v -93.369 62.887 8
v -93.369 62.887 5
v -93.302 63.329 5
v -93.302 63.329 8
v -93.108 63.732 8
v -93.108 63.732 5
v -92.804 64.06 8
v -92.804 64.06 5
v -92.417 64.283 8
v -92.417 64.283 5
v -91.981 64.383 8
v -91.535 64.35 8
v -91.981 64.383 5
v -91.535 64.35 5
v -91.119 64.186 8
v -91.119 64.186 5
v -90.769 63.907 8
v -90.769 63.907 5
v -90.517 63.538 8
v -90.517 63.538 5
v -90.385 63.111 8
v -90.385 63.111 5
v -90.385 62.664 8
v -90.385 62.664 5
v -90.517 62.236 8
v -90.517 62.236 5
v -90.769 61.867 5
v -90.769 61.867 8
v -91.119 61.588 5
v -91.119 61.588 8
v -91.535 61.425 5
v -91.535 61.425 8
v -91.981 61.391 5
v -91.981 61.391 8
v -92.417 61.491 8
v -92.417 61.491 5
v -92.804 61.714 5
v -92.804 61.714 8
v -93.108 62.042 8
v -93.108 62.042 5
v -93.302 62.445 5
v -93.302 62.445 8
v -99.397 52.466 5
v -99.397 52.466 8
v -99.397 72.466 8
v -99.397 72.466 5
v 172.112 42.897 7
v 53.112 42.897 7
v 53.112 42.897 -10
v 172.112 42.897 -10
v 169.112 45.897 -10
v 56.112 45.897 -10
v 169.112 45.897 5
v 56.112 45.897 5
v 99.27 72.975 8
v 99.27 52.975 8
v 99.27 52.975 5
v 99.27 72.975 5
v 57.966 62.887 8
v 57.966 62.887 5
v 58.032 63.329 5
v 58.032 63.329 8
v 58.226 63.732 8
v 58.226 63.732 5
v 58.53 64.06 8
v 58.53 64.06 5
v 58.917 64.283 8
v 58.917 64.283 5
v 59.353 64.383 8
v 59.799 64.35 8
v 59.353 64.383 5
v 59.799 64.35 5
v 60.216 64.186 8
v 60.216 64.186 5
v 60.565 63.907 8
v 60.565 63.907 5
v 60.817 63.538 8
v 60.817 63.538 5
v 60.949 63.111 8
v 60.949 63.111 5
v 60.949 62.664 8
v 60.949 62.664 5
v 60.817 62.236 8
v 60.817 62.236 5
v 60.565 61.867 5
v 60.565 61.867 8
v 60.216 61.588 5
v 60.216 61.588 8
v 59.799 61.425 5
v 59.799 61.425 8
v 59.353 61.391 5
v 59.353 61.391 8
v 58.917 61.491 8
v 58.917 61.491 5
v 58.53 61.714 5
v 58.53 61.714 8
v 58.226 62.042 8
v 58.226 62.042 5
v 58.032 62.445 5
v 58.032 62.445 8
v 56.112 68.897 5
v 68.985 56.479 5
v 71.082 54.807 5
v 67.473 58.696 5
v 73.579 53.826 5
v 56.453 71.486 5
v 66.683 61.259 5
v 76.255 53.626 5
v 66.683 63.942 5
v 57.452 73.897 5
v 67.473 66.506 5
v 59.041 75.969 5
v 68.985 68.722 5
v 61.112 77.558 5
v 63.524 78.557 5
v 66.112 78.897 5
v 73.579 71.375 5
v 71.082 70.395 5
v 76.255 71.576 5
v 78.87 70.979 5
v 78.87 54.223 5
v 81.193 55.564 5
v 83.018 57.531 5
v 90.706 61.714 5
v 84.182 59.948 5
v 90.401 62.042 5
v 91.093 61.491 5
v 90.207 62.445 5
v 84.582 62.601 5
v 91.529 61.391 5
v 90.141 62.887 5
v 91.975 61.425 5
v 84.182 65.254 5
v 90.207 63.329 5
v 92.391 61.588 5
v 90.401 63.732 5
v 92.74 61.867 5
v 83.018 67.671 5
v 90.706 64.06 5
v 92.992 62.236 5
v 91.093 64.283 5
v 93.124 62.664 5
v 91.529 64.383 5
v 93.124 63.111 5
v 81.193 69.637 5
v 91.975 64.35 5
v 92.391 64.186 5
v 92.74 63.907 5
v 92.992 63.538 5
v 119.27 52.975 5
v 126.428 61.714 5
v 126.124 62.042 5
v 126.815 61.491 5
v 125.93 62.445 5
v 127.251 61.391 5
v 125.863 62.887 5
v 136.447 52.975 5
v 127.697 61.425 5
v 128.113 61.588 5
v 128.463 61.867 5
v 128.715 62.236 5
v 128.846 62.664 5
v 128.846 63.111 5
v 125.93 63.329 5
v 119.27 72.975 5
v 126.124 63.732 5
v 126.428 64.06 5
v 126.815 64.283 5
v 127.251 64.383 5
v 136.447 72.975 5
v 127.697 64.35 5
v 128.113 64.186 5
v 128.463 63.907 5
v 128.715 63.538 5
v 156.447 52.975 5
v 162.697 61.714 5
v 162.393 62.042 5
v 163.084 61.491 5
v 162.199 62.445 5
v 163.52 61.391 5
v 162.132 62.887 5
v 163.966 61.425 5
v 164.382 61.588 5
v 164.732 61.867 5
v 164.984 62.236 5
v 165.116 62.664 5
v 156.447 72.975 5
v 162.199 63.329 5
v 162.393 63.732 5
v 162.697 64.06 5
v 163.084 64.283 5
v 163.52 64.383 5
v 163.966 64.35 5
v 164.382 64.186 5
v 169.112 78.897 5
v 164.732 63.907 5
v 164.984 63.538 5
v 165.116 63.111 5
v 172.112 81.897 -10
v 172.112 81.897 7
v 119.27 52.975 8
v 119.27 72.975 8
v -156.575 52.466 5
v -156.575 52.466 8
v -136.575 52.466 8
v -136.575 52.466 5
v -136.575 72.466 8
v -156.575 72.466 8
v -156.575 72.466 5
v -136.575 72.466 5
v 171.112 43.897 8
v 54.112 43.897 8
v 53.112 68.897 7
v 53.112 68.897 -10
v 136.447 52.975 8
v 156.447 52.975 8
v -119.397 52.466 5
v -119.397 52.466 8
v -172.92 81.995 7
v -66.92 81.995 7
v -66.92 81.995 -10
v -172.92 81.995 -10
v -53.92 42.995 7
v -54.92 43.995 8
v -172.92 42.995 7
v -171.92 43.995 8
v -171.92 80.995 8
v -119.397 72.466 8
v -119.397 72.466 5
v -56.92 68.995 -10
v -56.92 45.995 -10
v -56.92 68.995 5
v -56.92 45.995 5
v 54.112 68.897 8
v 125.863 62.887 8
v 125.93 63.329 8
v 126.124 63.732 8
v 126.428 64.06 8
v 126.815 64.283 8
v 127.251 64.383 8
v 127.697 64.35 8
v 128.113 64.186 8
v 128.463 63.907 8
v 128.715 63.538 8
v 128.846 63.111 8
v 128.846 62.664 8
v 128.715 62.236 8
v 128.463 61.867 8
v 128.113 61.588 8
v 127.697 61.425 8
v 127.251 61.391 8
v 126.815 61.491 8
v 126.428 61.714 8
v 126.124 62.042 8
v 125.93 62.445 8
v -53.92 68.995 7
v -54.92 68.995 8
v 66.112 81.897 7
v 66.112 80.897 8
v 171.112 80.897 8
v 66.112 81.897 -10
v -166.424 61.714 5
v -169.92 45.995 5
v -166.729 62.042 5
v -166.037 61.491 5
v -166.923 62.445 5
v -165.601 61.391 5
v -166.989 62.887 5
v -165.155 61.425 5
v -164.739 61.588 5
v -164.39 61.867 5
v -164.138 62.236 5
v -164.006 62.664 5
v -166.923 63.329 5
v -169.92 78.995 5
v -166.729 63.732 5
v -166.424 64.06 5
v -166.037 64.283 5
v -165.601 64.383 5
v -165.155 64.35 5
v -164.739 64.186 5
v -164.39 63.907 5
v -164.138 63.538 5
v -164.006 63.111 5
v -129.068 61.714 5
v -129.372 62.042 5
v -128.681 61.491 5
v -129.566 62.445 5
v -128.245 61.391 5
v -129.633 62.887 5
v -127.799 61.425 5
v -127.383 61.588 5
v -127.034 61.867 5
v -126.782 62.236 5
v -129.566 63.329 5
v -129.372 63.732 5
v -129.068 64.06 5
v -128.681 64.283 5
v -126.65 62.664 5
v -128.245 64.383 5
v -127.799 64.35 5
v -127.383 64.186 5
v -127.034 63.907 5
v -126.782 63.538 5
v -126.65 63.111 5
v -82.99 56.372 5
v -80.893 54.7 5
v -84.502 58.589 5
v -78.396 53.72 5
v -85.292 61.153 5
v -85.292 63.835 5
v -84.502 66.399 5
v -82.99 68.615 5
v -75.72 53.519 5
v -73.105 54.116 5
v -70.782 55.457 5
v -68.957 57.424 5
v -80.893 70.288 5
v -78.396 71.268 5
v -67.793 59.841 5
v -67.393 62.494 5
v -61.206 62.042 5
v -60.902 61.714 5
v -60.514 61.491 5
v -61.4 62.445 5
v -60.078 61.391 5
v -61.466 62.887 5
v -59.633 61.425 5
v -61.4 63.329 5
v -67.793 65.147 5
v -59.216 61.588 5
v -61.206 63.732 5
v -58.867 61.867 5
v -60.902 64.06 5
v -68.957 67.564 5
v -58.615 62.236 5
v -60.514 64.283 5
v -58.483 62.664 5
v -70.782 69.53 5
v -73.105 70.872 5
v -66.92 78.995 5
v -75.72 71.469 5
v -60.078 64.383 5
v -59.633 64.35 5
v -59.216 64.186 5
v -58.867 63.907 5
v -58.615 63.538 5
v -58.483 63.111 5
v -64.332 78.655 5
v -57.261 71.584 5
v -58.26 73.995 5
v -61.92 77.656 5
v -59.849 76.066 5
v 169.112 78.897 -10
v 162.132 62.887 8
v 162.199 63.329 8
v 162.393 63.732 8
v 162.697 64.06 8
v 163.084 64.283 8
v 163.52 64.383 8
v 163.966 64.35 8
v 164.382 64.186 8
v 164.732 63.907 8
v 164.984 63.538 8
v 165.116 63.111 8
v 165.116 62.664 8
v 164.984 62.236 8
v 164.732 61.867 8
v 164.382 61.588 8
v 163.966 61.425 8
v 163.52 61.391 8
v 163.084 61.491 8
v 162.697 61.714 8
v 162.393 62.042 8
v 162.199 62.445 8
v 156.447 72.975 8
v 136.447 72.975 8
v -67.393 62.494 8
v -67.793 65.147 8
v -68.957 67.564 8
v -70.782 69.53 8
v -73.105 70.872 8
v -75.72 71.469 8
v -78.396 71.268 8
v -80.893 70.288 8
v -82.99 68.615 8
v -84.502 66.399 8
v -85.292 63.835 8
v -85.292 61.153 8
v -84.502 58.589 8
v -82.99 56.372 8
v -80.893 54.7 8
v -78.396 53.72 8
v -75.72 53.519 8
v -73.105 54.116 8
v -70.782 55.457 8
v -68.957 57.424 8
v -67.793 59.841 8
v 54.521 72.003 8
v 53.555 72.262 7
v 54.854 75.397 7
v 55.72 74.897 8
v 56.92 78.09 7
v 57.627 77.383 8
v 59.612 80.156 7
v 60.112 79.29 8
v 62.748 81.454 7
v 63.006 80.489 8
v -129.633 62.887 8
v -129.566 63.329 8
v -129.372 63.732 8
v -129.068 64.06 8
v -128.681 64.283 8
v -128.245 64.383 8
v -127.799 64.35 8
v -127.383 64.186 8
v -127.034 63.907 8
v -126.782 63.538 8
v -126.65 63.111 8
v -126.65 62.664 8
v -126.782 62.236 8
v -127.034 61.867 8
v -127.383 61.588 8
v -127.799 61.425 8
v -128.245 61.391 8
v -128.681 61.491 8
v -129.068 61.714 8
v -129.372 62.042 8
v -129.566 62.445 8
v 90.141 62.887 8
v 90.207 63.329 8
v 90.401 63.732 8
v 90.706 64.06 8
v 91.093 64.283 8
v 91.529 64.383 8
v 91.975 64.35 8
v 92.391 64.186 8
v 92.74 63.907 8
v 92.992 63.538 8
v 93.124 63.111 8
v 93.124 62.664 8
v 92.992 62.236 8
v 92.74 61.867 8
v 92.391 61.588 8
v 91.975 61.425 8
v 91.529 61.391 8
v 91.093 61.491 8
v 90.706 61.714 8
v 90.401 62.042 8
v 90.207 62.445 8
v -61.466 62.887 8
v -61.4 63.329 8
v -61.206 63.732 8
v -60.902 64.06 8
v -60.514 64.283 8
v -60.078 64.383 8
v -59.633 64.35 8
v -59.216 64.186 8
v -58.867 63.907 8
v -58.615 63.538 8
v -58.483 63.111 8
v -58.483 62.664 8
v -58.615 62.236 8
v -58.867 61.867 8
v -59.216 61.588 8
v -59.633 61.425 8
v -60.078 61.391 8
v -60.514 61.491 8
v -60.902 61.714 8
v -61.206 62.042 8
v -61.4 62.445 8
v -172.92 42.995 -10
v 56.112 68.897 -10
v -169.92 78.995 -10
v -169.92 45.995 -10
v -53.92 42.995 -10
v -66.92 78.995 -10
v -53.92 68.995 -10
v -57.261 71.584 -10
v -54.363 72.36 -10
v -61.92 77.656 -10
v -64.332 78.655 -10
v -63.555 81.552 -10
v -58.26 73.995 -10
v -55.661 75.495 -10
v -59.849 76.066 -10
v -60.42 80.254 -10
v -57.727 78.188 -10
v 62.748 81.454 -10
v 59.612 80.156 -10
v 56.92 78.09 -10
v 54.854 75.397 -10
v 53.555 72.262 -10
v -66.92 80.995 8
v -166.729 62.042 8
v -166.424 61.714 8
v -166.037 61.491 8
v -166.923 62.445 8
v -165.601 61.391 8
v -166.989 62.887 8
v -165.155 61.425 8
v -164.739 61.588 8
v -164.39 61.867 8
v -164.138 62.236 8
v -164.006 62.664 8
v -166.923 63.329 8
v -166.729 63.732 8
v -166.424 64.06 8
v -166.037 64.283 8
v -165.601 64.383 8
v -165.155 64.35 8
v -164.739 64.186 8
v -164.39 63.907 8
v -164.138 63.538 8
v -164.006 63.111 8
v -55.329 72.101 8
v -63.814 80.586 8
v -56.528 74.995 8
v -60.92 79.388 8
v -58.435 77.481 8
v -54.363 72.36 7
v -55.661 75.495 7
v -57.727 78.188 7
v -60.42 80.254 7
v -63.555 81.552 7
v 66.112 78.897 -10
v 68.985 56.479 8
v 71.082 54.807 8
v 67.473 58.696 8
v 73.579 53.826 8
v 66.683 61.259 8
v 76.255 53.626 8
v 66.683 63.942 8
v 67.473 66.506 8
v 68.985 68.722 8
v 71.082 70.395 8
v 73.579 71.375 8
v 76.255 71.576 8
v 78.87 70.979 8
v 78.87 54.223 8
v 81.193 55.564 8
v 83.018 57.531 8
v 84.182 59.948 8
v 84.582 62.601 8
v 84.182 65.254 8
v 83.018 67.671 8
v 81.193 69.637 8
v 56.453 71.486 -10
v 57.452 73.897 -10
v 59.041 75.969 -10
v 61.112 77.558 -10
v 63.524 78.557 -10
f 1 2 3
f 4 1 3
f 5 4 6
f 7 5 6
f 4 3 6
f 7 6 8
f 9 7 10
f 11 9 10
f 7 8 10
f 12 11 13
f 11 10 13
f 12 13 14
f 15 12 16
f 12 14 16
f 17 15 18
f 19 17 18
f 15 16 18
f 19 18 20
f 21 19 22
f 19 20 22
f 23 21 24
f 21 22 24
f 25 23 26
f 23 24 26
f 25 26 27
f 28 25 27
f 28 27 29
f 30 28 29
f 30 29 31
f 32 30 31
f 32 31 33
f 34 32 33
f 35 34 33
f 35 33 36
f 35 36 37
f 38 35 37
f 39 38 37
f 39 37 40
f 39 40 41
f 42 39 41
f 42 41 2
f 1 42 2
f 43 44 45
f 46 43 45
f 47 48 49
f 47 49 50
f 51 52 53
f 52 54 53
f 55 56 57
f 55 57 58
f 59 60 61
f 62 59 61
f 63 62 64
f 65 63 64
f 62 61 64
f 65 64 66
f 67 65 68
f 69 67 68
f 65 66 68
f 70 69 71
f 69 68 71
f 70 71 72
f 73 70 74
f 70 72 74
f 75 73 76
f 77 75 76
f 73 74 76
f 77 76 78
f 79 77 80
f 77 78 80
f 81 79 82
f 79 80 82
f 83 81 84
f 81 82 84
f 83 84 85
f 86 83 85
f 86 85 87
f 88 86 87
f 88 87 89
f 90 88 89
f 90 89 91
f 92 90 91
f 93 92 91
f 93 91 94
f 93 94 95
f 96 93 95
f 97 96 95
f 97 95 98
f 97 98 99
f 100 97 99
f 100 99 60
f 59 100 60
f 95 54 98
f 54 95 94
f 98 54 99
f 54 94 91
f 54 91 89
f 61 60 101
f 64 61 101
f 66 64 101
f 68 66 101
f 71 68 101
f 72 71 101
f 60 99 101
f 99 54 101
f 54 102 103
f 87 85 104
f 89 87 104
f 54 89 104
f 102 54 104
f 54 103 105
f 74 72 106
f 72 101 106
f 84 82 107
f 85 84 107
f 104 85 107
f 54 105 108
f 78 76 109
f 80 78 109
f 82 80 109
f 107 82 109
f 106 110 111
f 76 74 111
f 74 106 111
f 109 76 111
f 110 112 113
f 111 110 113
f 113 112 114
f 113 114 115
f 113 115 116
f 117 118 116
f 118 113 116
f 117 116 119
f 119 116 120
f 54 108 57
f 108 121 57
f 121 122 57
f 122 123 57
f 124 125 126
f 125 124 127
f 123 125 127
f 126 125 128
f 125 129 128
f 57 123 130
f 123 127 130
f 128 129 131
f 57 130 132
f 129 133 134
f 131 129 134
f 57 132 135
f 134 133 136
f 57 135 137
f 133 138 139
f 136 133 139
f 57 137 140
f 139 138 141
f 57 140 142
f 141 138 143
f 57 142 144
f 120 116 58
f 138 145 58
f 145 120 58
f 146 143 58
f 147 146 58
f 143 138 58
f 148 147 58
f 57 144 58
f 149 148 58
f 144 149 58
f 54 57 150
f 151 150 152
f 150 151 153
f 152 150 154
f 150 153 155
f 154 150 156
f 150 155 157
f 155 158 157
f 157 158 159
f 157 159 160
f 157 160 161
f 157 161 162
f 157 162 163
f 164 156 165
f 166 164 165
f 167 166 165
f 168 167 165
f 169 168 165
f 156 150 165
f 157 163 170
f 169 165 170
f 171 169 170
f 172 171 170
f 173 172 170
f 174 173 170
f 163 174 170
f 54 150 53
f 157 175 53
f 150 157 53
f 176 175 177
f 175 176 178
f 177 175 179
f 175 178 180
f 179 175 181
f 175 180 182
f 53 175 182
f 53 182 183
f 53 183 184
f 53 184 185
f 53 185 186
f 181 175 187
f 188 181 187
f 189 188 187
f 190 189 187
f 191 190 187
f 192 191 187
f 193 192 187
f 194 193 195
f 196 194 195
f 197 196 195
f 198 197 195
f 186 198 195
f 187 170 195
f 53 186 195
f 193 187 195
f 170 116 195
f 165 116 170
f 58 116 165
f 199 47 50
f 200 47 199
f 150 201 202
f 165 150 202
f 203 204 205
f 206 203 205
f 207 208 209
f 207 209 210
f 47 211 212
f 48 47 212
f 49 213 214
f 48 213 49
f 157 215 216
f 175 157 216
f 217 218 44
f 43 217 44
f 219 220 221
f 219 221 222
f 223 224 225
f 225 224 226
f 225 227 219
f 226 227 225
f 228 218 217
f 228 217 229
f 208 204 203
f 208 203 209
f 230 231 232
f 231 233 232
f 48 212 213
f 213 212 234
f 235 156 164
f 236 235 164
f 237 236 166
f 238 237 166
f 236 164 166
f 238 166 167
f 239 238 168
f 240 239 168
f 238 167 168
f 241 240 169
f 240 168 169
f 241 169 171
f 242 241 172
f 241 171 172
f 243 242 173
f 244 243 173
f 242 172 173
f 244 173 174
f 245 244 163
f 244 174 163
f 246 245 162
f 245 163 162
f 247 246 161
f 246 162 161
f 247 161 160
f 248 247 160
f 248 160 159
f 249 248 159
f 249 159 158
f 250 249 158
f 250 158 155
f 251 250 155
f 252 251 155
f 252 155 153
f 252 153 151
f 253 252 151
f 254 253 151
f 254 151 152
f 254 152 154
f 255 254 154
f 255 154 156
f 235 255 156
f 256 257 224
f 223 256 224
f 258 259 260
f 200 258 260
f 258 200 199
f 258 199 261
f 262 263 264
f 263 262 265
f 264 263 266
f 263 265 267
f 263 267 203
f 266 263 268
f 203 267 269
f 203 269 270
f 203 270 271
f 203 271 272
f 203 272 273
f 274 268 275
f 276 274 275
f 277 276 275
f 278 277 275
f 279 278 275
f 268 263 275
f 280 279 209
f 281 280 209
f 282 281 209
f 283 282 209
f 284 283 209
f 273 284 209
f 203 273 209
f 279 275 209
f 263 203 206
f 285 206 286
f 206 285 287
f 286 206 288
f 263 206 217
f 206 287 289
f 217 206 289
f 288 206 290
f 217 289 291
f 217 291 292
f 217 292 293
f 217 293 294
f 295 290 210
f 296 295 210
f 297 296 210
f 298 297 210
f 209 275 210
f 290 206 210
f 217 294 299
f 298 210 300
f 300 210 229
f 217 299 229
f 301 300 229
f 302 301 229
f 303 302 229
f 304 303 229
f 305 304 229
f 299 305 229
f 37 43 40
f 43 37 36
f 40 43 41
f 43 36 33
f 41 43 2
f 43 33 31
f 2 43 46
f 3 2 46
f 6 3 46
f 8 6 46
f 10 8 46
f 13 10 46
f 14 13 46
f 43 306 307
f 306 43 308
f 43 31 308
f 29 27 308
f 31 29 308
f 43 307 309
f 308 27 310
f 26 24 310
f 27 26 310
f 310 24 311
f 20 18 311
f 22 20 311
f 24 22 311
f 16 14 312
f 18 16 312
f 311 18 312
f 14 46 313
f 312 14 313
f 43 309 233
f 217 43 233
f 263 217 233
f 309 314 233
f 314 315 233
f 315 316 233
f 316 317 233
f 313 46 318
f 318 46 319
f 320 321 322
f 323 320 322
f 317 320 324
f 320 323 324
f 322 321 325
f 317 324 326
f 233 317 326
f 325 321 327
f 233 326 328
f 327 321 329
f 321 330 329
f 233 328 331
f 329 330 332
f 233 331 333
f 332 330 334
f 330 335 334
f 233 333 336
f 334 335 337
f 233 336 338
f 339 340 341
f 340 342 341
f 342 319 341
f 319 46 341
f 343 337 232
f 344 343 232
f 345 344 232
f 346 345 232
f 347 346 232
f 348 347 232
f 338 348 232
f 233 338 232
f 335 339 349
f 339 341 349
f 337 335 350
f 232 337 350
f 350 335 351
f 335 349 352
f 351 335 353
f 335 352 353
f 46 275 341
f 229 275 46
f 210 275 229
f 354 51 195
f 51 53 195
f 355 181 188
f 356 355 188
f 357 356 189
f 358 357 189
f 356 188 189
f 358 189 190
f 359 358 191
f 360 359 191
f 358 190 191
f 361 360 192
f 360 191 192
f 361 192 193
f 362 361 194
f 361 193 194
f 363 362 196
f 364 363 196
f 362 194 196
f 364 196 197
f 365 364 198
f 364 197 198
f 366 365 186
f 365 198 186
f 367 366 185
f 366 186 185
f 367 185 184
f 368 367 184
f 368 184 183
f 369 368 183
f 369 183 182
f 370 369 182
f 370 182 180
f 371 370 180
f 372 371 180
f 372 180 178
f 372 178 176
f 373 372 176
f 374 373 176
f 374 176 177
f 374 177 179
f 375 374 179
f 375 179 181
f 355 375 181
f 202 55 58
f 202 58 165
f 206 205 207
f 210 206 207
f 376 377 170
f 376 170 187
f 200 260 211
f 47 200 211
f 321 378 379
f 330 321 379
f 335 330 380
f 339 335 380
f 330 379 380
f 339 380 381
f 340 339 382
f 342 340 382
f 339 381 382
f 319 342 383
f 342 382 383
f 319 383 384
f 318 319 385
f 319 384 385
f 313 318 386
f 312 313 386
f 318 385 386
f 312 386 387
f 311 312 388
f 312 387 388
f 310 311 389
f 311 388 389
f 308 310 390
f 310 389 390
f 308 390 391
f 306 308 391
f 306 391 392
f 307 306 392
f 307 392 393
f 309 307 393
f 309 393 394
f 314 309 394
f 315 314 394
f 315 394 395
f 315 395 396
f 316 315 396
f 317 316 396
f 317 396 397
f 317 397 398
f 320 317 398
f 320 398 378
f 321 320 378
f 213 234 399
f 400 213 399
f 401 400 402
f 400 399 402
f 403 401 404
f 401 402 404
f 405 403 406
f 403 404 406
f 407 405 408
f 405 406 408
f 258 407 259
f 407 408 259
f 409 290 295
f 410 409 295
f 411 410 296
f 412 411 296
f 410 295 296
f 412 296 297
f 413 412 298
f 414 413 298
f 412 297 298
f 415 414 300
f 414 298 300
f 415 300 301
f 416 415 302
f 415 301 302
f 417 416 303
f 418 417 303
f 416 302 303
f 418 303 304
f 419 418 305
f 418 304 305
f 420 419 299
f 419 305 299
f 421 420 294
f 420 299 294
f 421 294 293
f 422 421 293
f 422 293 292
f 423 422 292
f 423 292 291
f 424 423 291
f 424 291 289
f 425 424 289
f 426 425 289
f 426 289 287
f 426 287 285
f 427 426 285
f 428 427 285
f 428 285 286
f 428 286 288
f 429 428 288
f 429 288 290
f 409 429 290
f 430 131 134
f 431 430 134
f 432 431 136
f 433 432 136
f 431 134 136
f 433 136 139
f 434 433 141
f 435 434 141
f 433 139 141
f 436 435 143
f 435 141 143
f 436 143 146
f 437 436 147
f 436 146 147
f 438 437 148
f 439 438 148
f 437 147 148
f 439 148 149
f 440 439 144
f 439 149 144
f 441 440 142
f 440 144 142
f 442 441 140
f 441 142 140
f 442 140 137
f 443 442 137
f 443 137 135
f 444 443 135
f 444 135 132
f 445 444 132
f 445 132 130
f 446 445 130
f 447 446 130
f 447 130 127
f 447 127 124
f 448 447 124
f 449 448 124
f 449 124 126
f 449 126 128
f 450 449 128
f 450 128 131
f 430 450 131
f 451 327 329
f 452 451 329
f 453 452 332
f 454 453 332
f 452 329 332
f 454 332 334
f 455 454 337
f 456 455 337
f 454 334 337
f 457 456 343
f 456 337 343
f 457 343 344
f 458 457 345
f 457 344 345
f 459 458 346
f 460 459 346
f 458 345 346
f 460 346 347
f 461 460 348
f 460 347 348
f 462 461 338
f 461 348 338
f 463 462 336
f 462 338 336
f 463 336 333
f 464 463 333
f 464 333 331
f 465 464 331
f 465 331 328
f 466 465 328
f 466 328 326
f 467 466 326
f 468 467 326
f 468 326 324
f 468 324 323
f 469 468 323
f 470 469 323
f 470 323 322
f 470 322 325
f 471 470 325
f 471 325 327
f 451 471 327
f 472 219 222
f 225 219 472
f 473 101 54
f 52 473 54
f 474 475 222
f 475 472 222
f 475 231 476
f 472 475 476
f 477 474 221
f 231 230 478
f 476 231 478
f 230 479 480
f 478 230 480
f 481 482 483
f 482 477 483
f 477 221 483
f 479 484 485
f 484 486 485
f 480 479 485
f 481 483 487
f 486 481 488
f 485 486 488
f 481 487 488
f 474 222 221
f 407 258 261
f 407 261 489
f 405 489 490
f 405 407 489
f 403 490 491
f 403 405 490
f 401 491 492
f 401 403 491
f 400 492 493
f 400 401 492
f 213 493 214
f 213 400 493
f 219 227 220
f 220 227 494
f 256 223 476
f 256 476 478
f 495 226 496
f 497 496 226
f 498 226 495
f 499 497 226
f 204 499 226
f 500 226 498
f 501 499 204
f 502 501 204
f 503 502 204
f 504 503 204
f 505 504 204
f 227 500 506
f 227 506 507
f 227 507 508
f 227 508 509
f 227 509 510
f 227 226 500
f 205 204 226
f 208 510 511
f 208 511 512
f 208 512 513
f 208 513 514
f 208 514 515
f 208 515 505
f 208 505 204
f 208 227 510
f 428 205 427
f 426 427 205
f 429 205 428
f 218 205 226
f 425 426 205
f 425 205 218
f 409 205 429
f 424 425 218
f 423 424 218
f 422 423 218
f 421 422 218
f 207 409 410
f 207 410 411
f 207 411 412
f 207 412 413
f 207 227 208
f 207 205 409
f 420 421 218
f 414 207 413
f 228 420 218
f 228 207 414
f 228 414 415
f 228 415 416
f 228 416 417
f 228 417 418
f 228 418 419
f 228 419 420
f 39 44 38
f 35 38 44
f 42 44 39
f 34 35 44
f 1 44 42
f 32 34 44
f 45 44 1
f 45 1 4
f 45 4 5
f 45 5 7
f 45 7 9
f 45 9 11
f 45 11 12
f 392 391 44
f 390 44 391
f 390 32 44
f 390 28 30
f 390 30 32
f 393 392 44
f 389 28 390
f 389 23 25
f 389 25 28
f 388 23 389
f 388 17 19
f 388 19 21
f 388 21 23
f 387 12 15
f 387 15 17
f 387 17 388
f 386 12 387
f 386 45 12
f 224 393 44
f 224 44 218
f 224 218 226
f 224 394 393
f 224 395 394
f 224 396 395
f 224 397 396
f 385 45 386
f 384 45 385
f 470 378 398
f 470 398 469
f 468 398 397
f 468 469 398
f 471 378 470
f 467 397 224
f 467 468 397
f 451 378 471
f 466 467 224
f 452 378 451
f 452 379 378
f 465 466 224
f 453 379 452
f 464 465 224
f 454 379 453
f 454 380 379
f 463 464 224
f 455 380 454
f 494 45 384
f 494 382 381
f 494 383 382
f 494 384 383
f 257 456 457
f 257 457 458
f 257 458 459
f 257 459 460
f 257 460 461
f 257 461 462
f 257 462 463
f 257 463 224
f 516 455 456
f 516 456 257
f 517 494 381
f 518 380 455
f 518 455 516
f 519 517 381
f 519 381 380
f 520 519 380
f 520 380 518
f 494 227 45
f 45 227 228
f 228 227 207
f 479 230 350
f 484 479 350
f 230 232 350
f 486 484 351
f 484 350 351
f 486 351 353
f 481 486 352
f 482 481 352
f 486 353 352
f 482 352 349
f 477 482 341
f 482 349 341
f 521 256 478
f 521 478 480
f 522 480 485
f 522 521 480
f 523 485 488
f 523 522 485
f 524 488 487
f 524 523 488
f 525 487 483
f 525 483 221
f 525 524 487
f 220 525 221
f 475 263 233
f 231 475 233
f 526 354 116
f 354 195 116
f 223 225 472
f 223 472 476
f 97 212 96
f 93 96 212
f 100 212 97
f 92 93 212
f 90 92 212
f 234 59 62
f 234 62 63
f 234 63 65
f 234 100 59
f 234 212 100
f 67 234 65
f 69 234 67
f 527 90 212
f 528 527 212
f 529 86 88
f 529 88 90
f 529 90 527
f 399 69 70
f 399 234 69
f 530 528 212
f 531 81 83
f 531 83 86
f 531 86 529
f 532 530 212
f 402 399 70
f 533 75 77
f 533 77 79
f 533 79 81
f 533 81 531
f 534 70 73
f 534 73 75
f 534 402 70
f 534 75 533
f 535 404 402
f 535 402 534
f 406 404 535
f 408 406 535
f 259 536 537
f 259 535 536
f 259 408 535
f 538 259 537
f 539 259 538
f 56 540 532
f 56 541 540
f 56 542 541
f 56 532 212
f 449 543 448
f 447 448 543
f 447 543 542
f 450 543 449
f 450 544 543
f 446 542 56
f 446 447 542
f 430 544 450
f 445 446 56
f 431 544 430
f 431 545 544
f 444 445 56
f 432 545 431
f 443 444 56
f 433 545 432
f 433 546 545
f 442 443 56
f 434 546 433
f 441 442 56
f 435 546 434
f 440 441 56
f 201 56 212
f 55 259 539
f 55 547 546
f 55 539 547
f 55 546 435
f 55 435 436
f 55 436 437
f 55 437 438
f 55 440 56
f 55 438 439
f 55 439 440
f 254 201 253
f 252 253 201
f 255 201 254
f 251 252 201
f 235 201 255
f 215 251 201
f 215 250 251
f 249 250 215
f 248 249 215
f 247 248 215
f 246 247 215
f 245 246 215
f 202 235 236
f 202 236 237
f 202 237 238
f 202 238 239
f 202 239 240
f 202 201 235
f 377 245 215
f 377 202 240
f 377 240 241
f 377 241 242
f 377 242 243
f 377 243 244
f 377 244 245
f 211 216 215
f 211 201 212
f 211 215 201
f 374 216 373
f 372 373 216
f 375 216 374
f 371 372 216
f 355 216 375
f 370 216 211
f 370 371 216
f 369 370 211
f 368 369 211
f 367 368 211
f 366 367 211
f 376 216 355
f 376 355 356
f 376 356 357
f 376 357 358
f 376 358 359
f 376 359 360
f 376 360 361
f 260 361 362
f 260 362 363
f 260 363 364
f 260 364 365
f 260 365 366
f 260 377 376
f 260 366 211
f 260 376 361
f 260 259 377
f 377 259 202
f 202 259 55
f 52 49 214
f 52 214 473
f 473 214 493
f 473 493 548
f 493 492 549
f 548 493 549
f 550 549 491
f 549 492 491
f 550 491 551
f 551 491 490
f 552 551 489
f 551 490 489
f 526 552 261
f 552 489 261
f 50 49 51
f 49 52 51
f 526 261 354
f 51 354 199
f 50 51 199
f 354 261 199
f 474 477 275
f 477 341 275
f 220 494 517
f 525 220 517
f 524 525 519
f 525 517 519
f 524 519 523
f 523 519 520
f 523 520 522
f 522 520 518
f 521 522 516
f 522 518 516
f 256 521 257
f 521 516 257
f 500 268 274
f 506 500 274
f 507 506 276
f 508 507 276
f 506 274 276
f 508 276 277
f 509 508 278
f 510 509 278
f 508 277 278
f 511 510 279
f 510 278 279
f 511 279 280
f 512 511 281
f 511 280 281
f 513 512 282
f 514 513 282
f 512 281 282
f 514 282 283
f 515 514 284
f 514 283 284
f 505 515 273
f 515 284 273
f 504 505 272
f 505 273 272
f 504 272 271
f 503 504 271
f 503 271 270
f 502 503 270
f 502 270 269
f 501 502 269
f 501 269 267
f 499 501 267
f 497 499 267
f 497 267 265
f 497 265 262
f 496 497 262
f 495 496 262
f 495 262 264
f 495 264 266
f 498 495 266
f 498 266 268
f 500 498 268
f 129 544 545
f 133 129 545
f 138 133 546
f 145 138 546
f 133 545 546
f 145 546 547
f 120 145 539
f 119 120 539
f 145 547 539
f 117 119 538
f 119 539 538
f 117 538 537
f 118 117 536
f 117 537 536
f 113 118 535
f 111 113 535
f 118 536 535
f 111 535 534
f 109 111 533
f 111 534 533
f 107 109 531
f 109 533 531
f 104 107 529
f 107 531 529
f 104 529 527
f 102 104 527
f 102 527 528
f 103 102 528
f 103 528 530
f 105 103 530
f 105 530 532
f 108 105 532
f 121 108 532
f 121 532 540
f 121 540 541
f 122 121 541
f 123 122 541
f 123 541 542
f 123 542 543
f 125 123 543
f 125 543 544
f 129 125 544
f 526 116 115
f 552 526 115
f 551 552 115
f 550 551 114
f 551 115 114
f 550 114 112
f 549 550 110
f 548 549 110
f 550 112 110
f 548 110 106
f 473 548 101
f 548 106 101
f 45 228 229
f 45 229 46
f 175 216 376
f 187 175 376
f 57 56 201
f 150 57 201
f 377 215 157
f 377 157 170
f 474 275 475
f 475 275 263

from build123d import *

# Parameters (mm, degrees)
F1_DEPTH      = 5
F1_DEPTH_BACK = 10
F2_T          = 3
F2_2_T        = 3
F4_W          = 20
F4_H          = 20
F4_H_2        = 20.0000037253
F4_R          = 9
F5_DEPTH      = 50
F8_D          = 3
F8_DEPTH      = 40
F8_TIP        = 0.9012909285
F8_2_D        = 3
F8_2_DEPTH    = 40
F8_2_TIP      = 0.9012909285
F9_SIZE       = 1
F9_2_SIZE     = 1


with BuildPart() as f1:
    # F0 (on Top) → F1 (new body, two sides)
    with BuildSketch(Plane.XY) as f1_sk:
        with BuildLine():
            Line((169.1123094261, 78.8974409995), (66.1123094261, 78.8974409995))
            ThreePointArc((66.1123094261, 78.8974409995), (59.0412416142, 75.9685088113), (56.1123094261, 68.8974409995))
            Line((56.1123094261, 68.8974409995), (56.1123094261, 45.8974409995))
            Line((56.1123094261, 45.8974409995), (169.1123094261, 45.8974409995))
            Line((169.1123094261, 45.8974409995), (169.1123094261, 78.8974409995))
        make_face()
    extrude(amount=F1_DEPTH)
    extrude(f1_sk.sketch, amount=-F1_DEPTH_BACK)

    # F2
    f2_openings = [f1.faces().sort_by_distance(p)[0] for p in [
        (112.926417, 62.314864, -10),
    ]]
    offset(amount=F2_T, openings=f2_openings, kind=Kind.INTERSECTION)


with BuildPart() as f1b:
    # F0 (on Top) → F1, piece 2 (new body, two sides)
    with BuildSketch(Plane.XY) as f1_2_sk:
        with BuildLine():
            Line((-66.9198182523, 78.9953285099), (-169.9198182523, 78.9953285099))
            Line((-169.9198182523, 78.9953285099), (-169.9198182523, 45.9953285099))
            Line((-169.9198182523, 45.9953285099), (-56.9198182523, 45.9953285099))
            Line((-56.9198182523, 45.9953285099), (-56.9198182523, 68.9953285099))
            ThreePointArc((-56.9198182523, 68.9953285099), (-59.8487504405, 76.0663963218), (-66.9198182523, 78.9953285099))
        make_face()
    extrude(amount=F1_DEPTH)
    extrude(f1_2_sk.sketch, amount=-F1_DEPTH_BACK)

    # F2#2
    f2_2_openings = [f1b.faces().sort_by_distance(p)[0] for p in [
        (-113.733926, 62.412751, -10),
    ]]
    offset(amount=F2_2_T, openings=f2_2_openings, kind=Kind.INTERSECTION)


with BuildPart() as f5_tool:
    # F4 (on offset) → F5 (new body)
    with BuildSketch(Plane.XY.offset(33)):
        with Locations((-146.575255096, 62.4660721421)):
            Rectangle(F4_W, F4_H)
        with Locations((-109.3974763155, 62.4660702795)):
            Rectangle(F4_W, F4_H_2)
        with Locations((-76.3929139701, 62.4939369033)):
            Circle(F4_R)
        with Locations((75.5820007977, 62.6008242587)):
            Circle(F4_R)
        with Locations((109.2696897686, 62.9745572805)):
            Rectangle(F4_W, F4_H)
        with Locations((146.447468549, 62.9745554179)):
            Rectangle(F4_W, F4_H_2)
    extrude(amount=-F5_DEPTH)


with BuildPart() as f1_1:
    add(f1.part)

    # F5: cut by f5_tool
    add(f5_tool.part, mode=Mode.SUBTRACT)

    # F8
    with Locations(Plane.XY.offset(8)):
        with Locations((-128.1331330538, 62.8871805966), (163.6322605932, 62.8871805966), (127.36319817, 62.8871805966), (-165.489256382, 62.8871805966), (91.6408523917, 62.8871805966), (59.4655014575, 62.8871805966), (-91.8687133804, 62.8871805966), (-59.9663094311, 62.8871805966)):
            Hole(F8_D / 2, depth=F8_DEPTH)
            with Locations((0, 0, -(F8_DEPTH + F8_TIP / 2))):  # 118° drill point
                Cone(0, F8_D / 2, F8_TIP, mode=Mode.SUBTRACT)

    # F9
    f9_edges = [f1_1.edges().sort_by_distance(p)[0] for p in [
        (112.612309, 42.897441, 8),
        (172.112309, 62.397441, 8),
        (119.112309, 81.897441, 8),
        (56.919921, 78.089829, 8),
        (53.112309, 55.897441, 8),
    ]]
    chamfer(f9_edges, length=F9_SIZE)


with BuildPart() as f1b_1:
    add(f1b.part)

    # F5: cut by f5_tool
    add(f5_tool.part, mode=Mode.SUBTRACT)

    # F8#2
    with Locations(Plane.XY.offset(8)):
        with Locations((-128.1331330538, 62.8871805966), (163.6322605932, 62.8871805966), (127.36319817, 62.8871805966), (-165.489256382, 62.8871805966), (91.6408523917, 62.8871805966), (59.4655014575, 62.8871805966), (-91.8687133804, 62.8871805966), (-59.9663094311, 62.8871805966)):
            Hole(F8_2_D / 2, depth=F8_2_DEPTH)
            with Locations((0, 0, -(F8_2_DEPTH + F8_2_TIP / 2))):  # 118° drill point
                Cone(0, F8_2_D / 2, F8_2_TIP, mode=Mode.SUBTRACT)

    # F9#2
    f9_2_edges = [f1b_1.edges().sort_by_distance(p)[0] for p in [
        (-53.919818, 55.995329, 8),
        (-57.72743, 78.187717, 8),
        (-119.919818, 81.995329, 8),
        (-172.919818, 62.495329, 8),
        (-113.419818, 42.995329, 8),
    ]]
    chamfer(f9_2_edges, length=F9_2_SIZE)


solid = Compound([f1_1.part, f1b_1.part])
